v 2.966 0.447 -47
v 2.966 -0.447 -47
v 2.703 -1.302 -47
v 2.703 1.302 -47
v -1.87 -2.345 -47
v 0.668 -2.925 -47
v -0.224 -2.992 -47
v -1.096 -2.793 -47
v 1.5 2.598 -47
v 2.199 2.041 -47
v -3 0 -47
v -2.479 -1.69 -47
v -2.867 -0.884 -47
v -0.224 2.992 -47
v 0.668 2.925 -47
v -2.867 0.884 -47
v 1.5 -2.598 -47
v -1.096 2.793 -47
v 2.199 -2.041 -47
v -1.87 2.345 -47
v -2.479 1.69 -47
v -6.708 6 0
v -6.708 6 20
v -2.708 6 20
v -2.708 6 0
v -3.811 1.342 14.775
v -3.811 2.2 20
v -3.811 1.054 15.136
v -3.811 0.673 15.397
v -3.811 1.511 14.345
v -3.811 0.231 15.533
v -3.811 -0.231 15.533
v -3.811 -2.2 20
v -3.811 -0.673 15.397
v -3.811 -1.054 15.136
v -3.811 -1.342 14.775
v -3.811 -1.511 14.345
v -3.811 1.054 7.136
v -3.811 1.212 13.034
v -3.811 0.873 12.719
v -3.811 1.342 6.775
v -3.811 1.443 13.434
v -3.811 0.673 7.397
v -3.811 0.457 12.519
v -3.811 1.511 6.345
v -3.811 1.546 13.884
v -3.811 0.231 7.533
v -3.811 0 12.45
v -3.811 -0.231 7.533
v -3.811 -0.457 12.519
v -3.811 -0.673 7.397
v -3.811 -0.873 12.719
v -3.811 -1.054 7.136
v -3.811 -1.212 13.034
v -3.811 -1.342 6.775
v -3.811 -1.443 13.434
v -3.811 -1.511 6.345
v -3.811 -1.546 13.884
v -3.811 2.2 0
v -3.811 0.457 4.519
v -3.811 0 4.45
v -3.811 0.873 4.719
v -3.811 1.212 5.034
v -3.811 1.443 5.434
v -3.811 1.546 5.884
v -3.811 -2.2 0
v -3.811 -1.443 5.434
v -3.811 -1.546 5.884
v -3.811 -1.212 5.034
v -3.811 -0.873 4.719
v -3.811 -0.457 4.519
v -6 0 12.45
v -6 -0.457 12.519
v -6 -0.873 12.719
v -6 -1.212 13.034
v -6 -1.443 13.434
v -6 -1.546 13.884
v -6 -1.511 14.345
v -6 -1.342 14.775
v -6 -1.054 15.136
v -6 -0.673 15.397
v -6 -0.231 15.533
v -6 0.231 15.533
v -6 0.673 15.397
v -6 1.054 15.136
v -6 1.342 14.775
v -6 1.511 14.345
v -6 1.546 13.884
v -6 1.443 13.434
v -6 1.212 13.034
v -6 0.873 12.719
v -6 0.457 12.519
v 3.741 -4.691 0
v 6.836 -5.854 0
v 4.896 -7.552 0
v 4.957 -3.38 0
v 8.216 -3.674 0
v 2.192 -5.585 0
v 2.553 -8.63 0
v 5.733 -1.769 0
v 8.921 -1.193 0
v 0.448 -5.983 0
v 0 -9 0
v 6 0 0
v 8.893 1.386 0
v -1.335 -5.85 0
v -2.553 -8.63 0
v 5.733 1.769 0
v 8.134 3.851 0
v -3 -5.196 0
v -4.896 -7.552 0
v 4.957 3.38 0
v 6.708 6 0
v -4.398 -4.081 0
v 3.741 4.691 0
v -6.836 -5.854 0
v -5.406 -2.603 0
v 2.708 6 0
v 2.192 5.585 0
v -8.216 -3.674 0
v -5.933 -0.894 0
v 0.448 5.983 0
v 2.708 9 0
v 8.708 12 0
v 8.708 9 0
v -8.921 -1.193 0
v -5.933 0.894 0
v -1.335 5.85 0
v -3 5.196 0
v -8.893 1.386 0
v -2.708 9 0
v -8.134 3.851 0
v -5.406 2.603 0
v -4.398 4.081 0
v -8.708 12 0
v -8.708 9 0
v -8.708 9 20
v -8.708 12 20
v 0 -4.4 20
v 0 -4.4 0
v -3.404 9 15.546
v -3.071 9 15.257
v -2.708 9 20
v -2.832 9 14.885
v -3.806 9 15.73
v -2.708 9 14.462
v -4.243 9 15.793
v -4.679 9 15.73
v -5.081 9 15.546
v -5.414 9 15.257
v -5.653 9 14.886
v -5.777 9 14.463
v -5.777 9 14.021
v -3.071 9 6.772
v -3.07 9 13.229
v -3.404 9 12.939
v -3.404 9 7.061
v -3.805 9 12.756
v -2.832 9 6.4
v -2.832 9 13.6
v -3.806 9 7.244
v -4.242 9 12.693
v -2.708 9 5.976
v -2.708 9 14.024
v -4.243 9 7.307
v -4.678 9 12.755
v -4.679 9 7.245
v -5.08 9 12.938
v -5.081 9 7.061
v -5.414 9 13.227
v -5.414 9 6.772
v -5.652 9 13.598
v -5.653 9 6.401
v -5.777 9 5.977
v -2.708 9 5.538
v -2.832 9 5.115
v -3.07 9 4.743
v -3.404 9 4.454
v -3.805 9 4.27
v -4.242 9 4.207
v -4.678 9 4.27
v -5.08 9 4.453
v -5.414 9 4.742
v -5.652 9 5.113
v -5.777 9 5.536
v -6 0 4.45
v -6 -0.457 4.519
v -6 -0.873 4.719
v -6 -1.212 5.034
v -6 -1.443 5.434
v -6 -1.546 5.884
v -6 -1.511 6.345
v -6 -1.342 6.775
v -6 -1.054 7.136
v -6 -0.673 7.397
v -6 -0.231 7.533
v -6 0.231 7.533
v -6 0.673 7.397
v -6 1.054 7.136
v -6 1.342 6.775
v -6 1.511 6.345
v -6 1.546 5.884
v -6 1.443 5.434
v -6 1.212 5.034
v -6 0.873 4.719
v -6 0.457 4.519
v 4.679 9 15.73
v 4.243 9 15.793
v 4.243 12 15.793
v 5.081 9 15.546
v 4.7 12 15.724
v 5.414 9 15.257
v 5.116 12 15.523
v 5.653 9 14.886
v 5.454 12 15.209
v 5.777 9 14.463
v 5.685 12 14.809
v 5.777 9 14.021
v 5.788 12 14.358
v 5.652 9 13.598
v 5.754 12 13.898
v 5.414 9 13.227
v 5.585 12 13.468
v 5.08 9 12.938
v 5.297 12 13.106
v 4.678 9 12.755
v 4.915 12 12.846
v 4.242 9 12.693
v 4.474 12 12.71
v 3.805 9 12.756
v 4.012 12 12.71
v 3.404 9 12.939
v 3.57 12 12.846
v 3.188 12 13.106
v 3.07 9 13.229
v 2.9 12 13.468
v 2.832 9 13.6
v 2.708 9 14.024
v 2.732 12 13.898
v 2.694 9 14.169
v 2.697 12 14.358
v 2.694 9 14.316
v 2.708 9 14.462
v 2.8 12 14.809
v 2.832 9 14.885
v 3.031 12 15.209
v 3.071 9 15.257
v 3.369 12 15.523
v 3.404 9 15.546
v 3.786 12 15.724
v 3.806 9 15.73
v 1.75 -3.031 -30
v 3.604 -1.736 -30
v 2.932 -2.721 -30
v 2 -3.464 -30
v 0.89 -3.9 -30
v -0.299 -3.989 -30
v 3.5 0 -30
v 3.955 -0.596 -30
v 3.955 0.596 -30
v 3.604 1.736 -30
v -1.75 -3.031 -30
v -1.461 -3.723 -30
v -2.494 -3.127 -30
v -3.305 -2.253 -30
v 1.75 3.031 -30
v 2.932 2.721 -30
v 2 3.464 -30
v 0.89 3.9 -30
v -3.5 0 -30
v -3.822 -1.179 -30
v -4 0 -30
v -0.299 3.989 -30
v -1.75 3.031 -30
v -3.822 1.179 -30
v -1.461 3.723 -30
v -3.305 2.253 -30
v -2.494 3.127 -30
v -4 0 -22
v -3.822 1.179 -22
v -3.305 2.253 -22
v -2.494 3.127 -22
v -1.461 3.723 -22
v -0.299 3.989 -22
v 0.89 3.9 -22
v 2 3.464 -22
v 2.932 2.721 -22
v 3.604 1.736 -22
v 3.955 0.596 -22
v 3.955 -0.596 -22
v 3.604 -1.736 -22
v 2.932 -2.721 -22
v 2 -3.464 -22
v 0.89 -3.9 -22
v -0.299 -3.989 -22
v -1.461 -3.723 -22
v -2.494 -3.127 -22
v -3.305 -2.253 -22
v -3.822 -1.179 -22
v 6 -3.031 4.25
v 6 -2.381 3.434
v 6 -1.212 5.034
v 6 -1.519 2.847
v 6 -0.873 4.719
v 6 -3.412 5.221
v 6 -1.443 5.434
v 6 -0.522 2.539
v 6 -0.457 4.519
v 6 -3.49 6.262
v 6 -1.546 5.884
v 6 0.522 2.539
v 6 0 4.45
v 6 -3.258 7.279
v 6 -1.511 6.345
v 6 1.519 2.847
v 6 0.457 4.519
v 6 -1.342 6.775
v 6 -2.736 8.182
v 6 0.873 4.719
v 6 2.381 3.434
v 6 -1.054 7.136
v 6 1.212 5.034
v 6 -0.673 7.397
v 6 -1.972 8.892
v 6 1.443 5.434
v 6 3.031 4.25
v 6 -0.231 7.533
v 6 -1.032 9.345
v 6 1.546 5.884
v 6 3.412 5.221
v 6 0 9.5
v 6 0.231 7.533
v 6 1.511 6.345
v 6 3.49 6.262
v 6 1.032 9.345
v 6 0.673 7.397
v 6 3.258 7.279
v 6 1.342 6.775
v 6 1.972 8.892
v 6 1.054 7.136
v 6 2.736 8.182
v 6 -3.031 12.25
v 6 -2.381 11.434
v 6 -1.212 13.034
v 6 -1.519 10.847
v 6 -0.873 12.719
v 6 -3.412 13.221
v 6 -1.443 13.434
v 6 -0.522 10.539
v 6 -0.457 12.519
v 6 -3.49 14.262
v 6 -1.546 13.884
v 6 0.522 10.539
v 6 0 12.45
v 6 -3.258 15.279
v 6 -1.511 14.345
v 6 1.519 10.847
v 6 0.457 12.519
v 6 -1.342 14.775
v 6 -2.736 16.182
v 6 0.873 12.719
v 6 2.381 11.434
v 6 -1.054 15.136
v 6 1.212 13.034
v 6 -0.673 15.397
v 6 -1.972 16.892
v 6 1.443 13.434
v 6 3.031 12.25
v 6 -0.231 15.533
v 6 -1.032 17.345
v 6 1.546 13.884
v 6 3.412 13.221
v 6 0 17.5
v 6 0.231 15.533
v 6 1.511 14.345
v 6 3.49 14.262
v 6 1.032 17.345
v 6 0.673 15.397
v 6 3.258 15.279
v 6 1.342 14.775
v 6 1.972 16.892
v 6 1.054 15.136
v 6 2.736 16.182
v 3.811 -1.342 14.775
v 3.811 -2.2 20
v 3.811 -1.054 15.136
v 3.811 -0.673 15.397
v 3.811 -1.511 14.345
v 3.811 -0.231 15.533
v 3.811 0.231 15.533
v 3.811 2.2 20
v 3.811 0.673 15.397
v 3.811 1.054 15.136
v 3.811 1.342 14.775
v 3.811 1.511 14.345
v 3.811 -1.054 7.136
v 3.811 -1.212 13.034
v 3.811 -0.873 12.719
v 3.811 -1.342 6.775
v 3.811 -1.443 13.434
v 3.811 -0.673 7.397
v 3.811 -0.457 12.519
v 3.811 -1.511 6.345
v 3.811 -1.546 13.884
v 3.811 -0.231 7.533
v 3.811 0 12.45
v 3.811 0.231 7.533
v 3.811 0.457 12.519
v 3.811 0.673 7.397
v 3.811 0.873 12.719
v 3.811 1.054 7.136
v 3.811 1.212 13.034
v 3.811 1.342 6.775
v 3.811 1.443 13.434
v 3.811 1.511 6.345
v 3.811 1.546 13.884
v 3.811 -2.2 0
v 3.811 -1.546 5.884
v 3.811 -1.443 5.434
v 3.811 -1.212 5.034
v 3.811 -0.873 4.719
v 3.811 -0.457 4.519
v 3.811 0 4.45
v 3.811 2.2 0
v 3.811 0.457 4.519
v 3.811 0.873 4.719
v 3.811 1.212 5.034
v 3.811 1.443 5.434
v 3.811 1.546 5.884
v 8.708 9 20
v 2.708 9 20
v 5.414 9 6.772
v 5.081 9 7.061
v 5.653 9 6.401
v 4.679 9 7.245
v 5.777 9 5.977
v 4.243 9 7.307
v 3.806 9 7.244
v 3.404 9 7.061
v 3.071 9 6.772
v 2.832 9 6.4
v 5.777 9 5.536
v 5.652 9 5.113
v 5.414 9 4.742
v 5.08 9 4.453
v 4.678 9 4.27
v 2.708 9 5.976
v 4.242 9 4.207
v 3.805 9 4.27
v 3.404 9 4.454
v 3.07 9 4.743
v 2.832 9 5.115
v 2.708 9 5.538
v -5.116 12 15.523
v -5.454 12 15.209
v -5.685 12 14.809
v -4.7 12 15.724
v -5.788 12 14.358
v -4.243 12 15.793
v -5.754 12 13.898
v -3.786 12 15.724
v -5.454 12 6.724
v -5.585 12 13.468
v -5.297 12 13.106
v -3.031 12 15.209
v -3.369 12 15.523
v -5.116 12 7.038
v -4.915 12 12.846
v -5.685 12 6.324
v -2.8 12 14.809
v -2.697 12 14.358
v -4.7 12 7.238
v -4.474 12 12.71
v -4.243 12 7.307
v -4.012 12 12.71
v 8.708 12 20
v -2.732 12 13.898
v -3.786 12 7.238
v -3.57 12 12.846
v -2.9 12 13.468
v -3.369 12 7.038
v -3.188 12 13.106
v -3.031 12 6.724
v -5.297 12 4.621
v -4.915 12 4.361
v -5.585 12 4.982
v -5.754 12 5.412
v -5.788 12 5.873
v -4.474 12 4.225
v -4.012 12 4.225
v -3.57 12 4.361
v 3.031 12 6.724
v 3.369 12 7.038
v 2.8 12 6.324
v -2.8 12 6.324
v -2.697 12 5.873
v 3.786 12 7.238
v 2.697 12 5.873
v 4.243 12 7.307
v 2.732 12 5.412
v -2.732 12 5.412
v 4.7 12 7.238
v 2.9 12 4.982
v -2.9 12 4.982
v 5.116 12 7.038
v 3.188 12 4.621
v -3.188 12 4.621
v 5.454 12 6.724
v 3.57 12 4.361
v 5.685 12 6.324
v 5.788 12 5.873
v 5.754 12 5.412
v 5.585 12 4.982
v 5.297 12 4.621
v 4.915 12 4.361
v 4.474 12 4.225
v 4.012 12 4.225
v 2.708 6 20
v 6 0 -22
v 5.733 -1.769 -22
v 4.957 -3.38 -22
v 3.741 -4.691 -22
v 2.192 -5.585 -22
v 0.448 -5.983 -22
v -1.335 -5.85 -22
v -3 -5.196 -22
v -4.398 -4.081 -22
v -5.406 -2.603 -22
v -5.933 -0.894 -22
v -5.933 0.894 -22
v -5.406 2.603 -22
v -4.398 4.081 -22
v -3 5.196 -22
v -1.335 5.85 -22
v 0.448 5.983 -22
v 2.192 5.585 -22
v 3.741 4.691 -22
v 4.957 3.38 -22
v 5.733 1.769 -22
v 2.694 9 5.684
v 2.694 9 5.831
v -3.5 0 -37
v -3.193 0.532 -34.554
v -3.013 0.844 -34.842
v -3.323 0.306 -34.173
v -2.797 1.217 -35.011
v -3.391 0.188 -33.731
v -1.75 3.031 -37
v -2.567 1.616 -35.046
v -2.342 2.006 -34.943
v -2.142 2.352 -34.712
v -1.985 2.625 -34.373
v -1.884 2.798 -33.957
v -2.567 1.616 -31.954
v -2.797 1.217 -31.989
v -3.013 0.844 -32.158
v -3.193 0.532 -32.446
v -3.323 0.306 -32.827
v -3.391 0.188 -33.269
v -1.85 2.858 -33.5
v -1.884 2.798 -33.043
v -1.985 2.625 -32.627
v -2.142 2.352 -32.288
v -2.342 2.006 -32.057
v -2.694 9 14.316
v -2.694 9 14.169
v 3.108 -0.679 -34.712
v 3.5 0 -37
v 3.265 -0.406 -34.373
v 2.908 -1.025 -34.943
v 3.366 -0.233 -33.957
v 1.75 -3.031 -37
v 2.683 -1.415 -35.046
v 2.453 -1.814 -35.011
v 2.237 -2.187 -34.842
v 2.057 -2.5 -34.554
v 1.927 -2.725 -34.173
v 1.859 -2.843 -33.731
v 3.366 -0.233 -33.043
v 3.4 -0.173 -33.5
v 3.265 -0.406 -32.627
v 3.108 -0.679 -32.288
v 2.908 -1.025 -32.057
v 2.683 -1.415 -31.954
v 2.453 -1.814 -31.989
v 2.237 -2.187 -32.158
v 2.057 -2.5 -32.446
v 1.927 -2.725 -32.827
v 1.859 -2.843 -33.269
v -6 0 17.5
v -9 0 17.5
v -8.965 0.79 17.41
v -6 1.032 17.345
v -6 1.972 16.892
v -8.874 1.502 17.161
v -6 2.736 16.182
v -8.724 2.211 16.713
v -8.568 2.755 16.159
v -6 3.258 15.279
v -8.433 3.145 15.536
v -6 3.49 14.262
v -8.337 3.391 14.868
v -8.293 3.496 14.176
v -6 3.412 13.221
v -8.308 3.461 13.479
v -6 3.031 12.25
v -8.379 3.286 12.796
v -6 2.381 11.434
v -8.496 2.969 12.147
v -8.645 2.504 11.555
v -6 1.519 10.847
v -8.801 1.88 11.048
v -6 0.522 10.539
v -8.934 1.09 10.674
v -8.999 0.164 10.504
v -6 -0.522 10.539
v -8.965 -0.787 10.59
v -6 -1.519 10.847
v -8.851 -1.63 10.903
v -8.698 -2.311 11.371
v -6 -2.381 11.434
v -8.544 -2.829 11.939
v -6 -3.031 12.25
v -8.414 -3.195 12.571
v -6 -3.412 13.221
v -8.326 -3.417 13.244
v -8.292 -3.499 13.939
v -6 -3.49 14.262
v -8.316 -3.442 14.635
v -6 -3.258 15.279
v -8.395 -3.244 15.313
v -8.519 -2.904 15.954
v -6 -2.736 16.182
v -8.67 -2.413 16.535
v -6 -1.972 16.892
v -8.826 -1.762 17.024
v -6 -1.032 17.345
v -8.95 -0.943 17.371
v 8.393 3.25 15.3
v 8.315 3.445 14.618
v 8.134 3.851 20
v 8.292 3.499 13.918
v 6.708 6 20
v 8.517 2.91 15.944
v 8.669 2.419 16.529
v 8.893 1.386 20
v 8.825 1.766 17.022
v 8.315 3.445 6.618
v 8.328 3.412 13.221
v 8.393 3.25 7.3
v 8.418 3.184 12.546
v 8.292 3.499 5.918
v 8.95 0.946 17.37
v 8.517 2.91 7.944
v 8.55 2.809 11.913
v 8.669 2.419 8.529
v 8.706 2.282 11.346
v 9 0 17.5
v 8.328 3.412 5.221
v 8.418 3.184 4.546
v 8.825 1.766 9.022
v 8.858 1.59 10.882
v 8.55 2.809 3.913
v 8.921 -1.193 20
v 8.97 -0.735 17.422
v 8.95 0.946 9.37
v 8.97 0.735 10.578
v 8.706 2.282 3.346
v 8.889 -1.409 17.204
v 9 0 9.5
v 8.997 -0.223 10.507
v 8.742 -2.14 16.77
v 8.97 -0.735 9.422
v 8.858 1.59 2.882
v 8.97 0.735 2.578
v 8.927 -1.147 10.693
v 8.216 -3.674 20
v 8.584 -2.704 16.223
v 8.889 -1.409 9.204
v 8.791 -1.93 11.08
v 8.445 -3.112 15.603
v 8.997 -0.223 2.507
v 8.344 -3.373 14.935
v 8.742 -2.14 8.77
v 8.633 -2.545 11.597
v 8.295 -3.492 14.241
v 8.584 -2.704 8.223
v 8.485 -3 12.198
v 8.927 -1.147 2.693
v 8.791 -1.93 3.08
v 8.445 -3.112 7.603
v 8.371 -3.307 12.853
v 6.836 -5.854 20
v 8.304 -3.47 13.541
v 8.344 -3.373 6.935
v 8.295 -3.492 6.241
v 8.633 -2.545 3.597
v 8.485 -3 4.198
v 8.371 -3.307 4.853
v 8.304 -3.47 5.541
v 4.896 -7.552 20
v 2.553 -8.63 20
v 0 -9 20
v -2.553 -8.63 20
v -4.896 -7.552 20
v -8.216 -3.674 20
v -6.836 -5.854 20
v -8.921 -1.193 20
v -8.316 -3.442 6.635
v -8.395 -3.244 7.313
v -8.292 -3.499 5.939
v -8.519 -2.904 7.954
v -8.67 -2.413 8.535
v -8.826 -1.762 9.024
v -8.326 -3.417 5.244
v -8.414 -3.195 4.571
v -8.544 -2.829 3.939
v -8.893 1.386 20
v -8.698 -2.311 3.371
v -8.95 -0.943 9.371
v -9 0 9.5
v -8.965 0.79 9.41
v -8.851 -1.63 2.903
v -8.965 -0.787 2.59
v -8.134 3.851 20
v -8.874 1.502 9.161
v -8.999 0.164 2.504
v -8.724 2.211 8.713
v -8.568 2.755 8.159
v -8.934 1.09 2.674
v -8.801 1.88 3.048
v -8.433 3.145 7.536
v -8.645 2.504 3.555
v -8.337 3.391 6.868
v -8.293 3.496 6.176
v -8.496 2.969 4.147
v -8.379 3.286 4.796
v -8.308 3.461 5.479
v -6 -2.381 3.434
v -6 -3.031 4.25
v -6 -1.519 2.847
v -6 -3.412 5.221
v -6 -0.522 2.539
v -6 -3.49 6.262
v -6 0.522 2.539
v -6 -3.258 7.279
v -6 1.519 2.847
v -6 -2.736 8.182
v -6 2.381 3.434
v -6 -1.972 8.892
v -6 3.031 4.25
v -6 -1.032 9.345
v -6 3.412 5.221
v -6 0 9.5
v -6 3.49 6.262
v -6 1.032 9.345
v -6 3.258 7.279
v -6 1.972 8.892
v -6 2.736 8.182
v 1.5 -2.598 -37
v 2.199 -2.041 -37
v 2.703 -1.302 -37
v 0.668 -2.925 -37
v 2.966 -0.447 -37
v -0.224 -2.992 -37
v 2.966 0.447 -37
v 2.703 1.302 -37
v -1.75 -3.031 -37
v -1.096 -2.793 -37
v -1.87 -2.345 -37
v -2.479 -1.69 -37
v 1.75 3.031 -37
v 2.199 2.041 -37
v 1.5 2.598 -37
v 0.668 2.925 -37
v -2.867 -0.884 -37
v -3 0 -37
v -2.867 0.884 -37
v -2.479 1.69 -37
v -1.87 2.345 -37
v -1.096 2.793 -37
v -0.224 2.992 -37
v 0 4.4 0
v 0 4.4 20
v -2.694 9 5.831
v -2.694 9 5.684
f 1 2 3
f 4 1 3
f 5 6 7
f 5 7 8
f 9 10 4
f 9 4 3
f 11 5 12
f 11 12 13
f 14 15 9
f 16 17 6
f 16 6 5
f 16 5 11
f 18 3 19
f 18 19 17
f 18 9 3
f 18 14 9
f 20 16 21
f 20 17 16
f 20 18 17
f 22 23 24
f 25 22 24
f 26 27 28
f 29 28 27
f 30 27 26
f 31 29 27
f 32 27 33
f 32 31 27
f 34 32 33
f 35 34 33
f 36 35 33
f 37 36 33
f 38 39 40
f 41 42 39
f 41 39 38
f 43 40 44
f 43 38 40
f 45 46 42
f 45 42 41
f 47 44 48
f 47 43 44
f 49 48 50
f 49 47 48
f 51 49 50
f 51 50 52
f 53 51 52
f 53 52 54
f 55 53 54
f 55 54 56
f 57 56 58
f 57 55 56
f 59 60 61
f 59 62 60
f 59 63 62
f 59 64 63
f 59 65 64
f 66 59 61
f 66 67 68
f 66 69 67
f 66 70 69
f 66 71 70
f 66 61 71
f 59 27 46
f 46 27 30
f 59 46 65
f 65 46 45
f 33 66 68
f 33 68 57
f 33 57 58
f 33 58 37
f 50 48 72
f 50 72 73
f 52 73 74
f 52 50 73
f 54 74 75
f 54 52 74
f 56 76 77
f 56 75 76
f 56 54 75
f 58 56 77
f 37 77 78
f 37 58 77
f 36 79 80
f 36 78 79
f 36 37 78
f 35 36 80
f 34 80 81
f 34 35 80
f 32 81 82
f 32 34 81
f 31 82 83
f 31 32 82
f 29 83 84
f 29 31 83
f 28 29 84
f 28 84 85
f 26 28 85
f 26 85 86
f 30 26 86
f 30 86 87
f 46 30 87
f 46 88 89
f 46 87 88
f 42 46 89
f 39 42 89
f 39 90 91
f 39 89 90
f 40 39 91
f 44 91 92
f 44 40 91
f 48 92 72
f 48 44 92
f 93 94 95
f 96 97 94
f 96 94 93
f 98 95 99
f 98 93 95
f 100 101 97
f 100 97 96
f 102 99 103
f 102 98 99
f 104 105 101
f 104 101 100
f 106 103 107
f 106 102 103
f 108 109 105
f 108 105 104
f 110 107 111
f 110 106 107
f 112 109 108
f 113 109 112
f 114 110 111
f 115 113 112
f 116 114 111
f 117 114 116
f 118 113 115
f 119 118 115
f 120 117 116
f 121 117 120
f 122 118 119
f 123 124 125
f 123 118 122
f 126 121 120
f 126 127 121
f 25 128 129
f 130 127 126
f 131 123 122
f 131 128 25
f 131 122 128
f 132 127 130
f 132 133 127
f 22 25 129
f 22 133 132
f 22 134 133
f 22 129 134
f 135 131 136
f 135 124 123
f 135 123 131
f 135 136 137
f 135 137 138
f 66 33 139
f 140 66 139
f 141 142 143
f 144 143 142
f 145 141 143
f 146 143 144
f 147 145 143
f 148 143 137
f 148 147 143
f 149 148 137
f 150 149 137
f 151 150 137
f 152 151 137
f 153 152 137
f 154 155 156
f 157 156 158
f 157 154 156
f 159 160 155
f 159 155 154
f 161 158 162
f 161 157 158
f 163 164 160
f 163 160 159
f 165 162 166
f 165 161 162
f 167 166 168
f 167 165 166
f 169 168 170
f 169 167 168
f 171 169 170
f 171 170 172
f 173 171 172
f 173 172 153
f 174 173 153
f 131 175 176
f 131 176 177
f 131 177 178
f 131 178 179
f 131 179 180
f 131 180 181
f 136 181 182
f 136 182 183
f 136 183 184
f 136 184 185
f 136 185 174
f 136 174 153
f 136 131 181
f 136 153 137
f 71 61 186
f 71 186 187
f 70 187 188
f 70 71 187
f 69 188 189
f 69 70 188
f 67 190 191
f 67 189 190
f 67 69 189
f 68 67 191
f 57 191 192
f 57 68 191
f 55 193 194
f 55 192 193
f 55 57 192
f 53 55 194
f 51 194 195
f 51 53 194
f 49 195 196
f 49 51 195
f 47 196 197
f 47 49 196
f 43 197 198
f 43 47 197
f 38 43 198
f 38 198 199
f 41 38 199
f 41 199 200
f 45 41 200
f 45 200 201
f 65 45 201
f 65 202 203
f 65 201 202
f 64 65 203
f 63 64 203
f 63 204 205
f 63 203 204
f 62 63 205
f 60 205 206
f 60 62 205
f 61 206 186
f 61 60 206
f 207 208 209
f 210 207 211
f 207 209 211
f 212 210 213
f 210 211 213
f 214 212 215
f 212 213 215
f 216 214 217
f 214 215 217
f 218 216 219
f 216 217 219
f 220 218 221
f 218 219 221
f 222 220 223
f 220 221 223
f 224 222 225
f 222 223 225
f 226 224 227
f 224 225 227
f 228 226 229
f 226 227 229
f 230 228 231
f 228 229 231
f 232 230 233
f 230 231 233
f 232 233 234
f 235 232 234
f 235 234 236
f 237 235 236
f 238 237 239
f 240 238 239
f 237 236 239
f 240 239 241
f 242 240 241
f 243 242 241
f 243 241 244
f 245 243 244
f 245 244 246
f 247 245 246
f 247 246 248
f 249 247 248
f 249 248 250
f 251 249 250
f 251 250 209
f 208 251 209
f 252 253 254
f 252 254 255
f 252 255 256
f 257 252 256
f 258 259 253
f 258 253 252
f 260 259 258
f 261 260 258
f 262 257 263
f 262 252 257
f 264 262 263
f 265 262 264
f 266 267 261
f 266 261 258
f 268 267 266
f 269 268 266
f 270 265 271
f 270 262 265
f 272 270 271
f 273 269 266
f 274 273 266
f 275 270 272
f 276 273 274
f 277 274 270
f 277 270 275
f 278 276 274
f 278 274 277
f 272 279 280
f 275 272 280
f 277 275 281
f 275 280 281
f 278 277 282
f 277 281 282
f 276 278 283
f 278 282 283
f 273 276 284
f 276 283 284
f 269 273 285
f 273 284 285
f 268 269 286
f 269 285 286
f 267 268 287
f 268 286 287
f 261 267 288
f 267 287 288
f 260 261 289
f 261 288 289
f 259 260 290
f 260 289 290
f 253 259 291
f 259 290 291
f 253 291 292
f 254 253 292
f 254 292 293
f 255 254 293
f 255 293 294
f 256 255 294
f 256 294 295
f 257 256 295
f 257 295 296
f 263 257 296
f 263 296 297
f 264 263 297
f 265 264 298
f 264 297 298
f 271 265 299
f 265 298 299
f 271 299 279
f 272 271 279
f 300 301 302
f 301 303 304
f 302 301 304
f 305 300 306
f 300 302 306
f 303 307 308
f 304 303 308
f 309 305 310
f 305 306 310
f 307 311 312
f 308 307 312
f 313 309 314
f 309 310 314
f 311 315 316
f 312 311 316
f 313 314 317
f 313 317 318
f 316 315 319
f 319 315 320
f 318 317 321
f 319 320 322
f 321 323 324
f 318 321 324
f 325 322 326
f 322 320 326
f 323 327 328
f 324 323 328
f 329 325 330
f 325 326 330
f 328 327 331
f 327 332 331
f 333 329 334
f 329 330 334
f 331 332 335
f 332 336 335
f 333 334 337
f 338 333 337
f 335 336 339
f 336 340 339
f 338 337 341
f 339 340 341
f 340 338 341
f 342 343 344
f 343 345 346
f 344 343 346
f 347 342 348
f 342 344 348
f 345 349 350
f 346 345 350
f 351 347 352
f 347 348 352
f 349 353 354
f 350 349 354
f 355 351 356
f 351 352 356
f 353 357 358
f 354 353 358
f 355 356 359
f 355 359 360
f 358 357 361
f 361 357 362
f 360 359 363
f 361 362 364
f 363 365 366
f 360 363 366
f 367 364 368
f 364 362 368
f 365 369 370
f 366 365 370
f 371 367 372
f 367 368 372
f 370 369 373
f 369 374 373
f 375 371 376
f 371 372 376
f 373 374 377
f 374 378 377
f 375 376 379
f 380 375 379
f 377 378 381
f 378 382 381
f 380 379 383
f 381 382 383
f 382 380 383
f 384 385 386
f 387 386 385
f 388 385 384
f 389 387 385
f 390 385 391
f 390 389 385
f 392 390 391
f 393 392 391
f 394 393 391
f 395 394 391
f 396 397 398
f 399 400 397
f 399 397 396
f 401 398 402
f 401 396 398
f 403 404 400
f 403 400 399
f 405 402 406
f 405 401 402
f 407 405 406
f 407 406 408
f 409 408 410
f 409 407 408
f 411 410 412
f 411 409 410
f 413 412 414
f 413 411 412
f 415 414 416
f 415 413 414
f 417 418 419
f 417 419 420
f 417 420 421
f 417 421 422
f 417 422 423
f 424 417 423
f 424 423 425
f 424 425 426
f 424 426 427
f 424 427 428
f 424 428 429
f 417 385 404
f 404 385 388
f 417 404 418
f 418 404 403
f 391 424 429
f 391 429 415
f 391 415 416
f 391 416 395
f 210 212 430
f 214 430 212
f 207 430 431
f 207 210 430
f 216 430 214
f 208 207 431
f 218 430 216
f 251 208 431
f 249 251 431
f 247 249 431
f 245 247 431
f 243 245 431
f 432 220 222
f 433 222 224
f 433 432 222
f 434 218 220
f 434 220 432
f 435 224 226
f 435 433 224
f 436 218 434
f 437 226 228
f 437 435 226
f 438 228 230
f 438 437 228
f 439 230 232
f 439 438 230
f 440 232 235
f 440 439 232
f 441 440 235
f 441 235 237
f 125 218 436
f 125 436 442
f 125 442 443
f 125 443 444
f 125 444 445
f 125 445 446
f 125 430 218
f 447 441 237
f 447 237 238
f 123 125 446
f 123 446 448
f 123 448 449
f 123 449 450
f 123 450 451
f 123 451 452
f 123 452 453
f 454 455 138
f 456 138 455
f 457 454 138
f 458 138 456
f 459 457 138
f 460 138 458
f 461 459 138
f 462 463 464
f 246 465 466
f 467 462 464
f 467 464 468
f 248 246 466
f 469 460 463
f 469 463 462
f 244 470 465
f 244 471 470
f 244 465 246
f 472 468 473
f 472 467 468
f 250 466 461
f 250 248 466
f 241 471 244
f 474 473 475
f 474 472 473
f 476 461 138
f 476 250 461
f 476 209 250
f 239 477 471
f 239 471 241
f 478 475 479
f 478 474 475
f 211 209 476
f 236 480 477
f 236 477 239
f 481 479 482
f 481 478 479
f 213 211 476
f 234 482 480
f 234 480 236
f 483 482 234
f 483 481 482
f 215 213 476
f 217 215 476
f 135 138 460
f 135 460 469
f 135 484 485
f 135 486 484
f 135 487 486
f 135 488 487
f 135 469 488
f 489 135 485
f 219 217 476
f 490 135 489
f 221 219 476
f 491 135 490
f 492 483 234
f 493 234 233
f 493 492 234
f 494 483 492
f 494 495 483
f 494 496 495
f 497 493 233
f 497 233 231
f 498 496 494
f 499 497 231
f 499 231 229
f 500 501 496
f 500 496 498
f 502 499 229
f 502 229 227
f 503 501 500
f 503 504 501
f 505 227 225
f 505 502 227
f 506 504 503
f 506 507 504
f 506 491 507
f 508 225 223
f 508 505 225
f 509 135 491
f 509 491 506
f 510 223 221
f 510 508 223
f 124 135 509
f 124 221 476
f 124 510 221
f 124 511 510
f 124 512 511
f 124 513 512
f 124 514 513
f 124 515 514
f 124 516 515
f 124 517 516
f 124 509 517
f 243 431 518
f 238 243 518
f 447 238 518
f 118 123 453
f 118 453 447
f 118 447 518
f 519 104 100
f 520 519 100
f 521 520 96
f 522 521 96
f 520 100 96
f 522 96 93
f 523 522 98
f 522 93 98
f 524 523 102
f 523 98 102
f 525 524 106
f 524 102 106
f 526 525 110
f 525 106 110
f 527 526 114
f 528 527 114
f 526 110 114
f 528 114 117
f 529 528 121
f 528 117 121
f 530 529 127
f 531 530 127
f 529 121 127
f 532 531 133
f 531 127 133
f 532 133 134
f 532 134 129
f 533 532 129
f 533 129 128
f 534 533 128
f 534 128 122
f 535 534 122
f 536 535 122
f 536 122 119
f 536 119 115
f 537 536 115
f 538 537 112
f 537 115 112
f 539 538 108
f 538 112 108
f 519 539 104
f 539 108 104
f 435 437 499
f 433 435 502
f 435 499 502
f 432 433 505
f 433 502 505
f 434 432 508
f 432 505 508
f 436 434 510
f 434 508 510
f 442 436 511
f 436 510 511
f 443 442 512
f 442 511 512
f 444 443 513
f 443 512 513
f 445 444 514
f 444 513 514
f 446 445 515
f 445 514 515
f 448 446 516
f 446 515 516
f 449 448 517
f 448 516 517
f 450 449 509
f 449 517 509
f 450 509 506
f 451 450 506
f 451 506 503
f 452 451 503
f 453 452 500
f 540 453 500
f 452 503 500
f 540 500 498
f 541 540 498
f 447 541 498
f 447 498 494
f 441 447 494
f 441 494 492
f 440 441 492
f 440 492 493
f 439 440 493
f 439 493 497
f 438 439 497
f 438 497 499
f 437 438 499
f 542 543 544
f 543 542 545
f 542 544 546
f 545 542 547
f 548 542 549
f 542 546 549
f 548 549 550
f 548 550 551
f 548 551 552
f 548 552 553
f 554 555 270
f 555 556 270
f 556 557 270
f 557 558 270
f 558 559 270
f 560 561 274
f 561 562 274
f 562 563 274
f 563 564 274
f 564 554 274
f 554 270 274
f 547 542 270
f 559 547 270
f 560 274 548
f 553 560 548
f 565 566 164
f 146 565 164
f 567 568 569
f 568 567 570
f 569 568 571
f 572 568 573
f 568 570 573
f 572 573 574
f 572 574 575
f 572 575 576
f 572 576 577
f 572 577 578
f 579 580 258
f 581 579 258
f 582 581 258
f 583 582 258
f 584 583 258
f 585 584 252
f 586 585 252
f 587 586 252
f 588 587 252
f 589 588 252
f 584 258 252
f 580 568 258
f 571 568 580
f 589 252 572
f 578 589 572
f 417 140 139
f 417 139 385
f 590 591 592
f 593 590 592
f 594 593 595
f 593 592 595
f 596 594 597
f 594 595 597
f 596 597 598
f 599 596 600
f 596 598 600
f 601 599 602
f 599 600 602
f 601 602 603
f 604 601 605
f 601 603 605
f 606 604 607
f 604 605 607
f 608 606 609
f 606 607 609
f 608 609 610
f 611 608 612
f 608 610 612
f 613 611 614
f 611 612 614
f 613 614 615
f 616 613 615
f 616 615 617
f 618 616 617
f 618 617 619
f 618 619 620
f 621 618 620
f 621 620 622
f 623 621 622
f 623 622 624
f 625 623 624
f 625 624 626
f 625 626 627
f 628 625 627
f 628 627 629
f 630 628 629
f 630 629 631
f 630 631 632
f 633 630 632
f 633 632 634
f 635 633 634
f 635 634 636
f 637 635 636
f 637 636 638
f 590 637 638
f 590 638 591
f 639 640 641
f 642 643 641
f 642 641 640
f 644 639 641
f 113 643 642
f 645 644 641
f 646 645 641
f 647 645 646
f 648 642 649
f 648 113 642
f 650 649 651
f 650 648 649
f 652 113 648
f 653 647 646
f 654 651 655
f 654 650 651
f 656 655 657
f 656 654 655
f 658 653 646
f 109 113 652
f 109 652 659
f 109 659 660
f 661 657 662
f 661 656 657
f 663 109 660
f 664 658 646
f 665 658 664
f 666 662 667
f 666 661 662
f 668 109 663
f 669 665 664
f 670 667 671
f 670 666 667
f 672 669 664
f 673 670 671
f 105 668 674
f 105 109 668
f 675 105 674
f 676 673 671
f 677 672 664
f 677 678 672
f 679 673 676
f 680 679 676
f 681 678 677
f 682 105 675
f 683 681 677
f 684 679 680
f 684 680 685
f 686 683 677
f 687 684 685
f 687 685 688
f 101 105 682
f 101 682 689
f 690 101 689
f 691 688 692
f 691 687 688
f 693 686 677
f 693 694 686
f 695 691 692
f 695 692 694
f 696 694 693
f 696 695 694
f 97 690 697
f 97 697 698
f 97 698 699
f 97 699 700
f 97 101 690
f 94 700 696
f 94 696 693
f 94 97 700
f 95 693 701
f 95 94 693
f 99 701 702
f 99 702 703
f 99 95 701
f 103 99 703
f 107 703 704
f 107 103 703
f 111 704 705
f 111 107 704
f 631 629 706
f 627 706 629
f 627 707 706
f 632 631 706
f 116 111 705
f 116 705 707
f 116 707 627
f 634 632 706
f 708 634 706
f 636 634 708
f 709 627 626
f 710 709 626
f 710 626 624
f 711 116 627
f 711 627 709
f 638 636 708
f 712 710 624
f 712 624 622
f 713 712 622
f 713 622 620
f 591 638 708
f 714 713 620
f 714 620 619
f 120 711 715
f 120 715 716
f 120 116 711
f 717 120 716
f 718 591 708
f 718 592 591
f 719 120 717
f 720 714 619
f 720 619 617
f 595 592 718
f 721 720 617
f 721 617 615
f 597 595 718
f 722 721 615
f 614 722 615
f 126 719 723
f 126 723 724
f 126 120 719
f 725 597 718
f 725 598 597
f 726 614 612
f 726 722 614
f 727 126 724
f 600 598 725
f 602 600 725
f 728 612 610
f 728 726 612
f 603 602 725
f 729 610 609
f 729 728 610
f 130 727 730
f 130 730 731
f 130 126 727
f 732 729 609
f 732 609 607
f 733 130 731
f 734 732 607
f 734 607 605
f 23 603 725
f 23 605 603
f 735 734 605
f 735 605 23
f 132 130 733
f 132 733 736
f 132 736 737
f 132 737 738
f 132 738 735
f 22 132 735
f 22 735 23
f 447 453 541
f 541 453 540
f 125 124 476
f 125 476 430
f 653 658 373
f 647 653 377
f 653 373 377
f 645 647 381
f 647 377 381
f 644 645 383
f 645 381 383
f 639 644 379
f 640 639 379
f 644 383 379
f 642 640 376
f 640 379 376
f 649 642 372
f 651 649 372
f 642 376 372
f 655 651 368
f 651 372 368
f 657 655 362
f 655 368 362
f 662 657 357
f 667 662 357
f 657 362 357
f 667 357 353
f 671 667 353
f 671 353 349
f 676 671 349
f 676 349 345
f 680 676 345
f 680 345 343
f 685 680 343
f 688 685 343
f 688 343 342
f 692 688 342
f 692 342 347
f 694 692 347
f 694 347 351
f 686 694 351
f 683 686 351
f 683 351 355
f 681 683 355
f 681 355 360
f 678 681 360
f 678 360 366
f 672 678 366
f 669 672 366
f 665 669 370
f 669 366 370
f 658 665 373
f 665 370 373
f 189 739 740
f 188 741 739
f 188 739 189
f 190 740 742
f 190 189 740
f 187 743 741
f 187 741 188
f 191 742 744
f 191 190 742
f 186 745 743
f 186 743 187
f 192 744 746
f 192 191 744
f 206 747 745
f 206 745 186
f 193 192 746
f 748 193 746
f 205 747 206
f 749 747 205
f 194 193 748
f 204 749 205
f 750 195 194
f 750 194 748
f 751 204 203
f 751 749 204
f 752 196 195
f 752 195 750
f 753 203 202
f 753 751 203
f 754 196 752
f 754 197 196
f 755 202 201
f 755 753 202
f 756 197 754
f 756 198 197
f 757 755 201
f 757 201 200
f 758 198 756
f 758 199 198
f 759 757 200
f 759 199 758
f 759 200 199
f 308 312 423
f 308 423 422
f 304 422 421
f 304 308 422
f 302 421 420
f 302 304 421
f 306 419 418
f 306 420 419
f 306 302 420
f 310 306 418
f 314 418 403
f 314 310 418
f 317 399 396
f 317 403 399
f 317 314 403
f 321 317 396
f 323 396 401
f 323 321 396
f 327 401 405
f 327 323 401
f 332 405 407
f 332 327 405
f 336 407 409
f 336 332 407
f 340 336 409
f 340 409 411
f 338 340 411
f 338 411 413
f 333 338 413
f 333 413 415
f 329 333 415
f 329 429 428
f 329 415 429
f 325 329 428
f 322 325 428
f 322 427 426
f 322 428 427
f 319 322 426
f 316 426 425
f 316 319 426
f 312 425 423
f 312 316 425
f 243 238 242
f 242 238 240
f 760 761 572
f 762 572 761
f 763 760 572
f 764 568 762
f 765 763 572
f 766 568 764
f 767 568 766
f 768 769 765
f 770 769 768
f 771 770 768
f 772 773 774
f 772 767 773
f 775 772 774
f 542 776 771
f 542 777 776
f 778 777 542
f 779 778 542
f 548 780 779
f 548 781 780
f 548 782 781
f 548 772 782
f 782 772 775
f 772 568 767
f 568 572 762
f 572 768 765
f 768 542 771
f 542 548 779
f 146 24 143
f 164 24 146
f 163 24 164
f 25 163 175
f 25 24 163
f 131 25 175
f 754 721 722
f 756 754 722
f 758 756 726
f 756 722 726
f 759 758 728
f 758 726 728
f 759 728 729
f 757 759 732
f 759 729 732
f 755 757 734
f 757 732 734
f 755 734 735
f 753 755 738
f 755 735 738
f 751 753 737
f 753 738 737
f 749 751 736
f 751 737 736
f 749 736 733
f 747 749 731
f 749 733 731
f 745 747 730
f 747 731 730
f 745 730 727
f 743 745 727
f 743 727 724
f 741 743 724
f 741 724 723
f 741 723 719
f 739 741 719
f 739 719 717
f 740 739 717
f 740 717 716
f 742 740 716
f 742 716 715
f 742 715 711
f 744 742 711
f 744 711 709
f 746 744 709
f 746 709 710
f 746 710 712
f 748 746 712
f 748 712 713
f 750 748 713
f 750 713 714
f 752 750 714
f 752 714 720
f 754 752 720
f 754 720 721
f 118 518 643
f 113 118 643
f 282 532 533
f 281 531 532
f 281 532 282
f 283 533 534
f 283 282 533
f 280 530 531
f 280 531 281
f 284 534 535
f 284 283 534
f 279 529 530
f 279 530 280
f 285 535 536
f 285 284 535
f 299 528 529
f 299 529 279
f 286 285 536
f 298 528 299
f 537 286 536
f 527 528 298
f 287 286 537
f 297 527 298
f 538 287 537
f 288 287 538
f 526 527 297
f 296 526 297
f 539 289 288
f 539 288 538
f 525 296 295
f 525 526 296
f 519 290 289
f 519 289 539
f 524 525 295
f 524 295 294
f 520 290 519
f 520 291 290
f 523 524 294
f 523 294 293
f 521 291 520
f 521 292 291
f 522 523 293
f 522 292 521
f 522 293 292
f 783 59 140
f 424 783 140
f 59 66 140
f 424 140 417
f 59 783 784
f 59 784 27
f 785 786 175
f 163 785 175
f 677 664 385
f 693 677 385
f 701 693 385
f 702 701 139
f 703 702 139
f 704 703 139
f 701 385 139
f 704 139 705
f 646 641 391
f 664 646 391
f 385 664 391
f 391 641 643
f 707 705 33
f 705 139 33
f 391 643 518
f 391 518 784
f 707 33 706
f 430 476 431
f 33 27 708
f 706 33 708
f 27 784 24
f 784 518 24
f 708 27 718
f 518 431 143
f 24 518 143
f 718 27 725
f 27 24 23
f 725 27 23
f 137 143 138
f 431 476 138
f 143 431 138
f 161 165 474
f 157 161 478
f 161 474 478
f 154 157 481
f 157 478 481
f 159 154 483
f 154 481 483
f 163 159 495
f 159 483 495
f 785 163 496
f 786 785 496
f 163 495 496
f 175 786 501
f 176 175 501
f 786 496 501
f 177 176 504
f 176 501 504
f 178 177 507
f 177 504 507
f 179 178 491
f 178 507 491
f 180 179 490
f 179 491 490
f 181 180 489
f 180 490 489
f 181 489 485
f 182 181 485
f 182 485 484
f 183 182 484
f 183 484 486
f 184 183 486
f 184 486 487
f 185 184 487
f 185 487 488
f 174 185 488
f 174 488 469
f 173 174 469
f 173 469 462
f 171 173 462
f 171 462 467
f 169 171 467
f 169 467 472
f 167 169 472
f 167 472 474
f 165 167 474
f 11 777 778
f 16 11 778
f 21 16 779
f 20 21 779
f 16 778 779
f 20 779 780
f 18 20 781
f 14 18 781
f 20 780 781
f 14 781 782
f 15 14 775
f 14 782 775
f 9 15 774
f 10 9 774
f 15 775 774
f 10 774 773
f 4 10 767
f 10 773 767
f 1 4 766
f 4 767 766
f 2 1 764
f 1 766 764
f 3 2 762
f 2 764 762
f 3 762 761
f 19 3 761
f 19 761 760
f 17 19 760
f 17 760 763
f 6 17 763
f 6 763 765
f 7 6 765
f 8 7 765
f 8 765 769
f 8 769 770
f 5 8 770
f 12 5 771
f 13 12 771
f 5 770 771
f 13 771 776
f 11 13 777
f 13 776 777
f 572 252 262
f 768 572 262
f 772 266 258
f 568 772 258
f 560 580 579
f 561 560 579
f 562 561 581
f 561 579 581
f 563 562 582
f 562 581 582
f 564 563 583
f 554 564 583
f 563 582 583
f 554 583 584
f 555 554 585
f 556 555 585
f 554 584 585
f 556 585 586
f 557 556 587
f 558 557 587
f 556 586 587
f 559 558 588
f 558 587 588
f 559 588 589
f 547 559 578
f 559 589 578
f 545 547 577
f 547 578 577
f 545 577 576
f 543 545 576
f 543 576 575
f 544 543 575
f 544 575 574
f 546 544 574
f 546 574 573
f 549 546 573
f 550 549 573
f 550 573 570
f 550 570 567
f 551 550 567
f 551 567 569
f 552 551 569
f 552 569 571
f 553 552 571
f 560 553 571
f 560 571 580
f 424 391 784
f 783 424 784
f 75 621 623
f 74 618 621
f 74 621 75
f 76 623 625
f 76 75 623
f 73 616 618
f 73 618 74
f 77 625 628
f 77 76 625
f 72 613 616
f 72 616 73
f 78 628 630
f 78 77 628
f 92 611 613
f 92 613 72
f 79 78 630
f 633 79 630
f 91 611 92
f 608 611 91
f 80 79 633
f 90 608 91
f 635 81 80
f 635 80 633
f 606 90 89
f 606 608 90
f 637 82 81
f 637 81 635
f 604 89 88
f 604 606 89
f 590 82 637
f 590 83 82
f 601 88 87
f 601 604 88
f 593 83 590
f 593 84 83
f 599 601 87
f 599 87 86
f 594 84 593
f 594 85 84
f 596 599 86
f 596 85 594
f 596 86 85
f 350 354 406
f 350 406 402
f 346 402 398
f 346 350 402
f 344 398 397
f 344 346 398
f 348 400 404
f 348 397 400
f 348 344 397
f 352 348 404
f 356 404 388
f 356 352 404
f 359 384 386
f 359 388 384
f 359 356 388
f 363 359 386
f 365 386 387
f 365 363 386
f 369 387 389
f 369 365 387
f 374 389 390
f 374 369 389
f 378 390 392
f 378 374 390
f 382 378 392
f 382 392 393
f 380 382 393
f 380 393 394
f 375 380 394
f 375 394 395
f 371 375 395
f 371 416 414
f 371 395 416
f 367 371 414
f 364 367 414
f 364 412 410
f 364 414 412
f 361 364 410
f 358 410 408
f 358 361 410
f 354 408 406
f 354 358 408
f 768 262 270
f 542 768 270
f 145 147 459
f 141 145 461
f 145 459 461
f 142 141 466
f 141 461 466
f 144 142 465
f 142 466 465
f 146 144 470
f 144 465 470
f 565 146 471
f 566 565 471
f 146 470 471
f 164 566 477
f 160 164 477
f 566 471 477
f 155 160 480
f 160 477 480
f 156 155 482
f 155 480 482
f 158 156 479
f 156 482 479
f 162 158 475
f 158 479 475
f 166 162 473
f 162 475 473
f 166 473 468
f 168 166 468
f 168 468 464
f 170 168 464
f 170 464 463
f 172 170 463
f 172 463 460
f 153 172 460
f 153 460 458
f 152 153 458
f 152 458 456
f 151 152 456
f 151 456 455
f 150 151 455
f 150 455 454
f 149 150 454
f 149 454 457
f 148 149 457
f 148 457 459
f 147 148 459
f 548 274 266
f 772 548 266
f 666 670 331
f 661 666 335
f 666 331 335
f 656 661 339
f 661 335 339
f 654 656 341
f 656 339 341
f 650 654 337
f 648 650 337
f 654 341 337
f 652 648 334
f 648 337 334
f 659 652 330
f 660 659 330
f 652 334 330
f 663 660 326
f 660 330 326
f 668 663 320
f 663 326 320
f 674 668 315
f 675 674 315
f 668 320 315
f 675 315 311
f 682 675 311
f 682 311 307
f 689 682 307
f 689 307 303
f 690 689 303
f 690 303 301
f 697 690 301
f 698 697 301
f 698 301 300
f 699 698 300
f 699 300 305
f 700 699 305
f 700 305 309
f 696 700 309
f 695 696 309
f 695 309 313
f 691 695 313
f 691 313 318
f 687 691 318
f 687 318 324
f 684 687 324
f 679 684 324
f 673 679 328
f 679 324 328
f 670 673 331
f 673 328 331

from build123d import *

# Parameters (mm, degrees)
BOSS_EXTRUDE1_DEPTH     = 20
CUT_EXTRUDE1_DEPTH      = 9
CUT_EXTRUDE1_DEPTH_BACK = 9
SKETCH8_R               = 1.55
SKETCH11_R              = 6
BOSS_EXTRUDE12_DEPTH    = 22
SKETCH12_R              = 4
BOSS_EXTRUDE13_DEPTH    = 8
BOSS_EXTRUDE14_DEPTH    = 7
SKETCH14_R              = 1.55
CUT_EXTRUDE2_DEPTH      = 6.1
SKETCH15_R              = 3
BOSS_EXTRUDE15_DEPTH    = 10
CUT_EXTRUDE5_START      = 9
SKETCH16_R              = 3.5
CUT_EXTRUDE5_DEPTH      = 3
CUT_EXTRUDE6_START      = -6
SKETCH16_2_R            = 3.5
CUT_EXTRUDE6_DEPTH      = 3
SKETCH17_R              = 1.55
CUT_EXTRUDE7_DEPTH      = 3


with BuildPart() as part:
    # Sketch1 → Boss-Extrude1 (new body)
    with BuildSketch(Plane.XY):
        with BuildLine():
            Line((-8.708203932, 12), (8.708203932, 12))
            Line((8.708203932, 12), (8.708203932, 9))
            Line((8.708203932, 9), (2.708203932, 9))
            Line((2.708203932, 9), (2.708203932, 6))
            Line((2.708203932, 6), (6.708203932, 6))
            ThreePointArc((6.708203932, 6), (0, -9), (-6.708203932, 6))
            Line((-6.708203932, 6), (-2.708203932, 6))
            Line((-2.708203932, 6), (-2.708203932, 9))
            Line((-2.708203932, 9), (-8.708203932, 9))
            Line((-8.708203932, 9), (-8.708203932, 12))
        make_face()
        Polygon((0, 4.4), (-3.810511777, 2.2), (-3.810511777, -2.2), (0, -4.4), (3.810511777, -2.2), (3.810511777, 2.2), align=None, mode=Mode.SUBTRACT)
    extrude(amount=BOSS_EXTRUDE1_DEPTH)

    # Sketch8 → Cut-Extrude1 (cut, two sides: drawn at the far end of the back side and taken through both)
    with BuildSketch(Plane.ZY.offset(-CUT_EXTRUDE1_DEPTH_BACK)):
        with Locations(Location((6, 0, 0), (0, 0, 180))):
            Circle(SKETCH8_R)
        with Locations(Location((14, 0, 0), (0, 0, 180))):
            Circle(SKETCH8_R)
    extrude(amount=CUT_EXTRUDE1_DEPTH + CUT_EXTRUDE1_DEPTH_BACK, mode=Mode.SUBTRACT)

    # Sketch11 → Boss-Extrude12 (add)
    with BuildSketch(Plane(origin=(0, 0, 0), x_dir=(-1, 0, 0), z_dir=(0, 0, -1))):
        with Locations(Location((0, 0, 0), (0, 0, 180))):
            Circle(SKETCH11_R)
    extrude(amount=BOSS_EXTRUDE12_DEPTH)

    # Sketch12 → Boss-Extrude13 (add)
    with BuildSketch(Plane(origin=(0, 0, -22), x_dir=(-1, 0, 0), z_dir=(0, 0, -1))):
        Circle(SKETCH12_R)
    extrude(amount=BOSS_EXTRUDE13_DEPTH)

    # Sketch13 → Boss-Extrude14 (add)
    with BuildSketch(Plane(origin=(0, 0, -30), x_dir=(-1, 0, 0), z_dir=(0, 0, -1))):
        Polygon((1.75, 3.031088913), (-1.75, 3.031088913), (-3.5, 0), (-1.75, -3.031088913), (1.75, -3.031088913), (3.5, 0), align=None)
    extrude(amount=BOSS_EXTRUDE14_DEPTH)

    # Sketch14 → Cut-Extrude2 (cut)
    with BuildSketch(Plane(origin=(2.625, -1.515544457, 0), x_dir=(0, 0, -1), z_dir=(0.8660254037844379, -0.5000000000000011, 0))):
        with Locations(Location((33.5, 0, 0), (0, 0, 90))):
            Circle(SKETCH14_R)
    extrude(amount=-CUT_EXTRUDE2_DEPTH, mode=Mode.SUBTRACT)

    # Sketch15 → Boss-Extrude15 (add)
    with BuildSketch(Plane(origin=(0, 0, -37), x_dir=(-1, 0, 0), z_dir=(0, 0, -1))):
        Circle(SKETCH15_R)
    extrude(amount=BOSS_EXTRUDE15_DEPTH)

    # Sketch16 → Cut-Extrude5 (cut)
    with BuildSketch(Plane.ZY.offset(CUT_EXTRUDE5_START)):
        with Locations((6, 0)):
            Circle(SKETCH16_R)
        with Locations((14, 0)):
            Circle(SKETCH16_R)
    extrude(amount=-CUT_EXTRUDE5_DEPTH, mode=Mode.SUBTRACT)

    # Sketch16<2> → Cut-Extrude6 (cut)
    with BuildSketch(Plane.ZY.offset(CUT_EXTRUDE6_START)):
        with Locations((6, 0)):
            Circle(SKETCH16_2_R)
        with Locations((14, 0)):
            Circle(SKETCH16_2_R)
    extrude(amount=-CUT_EXTRUDE6_DEPTH, mode=Mode.SUBTRACT)

    # Sketch17 → Cut-Extrude7 (cut)
    with BuildSketch(Plane(origin=(0, 12, 0), x_dir=(1, 0, 0), z_dir=(0, 1, 0))):
        with Locations(Location((-4.242640687, -5.757359313, 0), (0, 0, 270))):
            Circle(SKETCH17_R)
        with Locations(Location((4.242640687, -5.757359313, 0), (0, 0, 270))):
            Circle(SKETCH17_R)
        with Locations(Location((4.242640687, -14.242640687, 0), (0, 0, 270))):
            Circle(SKETCH17_R)
        with Locations(Location((-4.242640687, -14.242640687, 0), (0, 0, 270))):
            Circle(SKETCH17_R)
    extrude(amount=-CUT_EXTRUDE7_DEPTH, mode=Mode.SUBTRACT)


solid = part.part
